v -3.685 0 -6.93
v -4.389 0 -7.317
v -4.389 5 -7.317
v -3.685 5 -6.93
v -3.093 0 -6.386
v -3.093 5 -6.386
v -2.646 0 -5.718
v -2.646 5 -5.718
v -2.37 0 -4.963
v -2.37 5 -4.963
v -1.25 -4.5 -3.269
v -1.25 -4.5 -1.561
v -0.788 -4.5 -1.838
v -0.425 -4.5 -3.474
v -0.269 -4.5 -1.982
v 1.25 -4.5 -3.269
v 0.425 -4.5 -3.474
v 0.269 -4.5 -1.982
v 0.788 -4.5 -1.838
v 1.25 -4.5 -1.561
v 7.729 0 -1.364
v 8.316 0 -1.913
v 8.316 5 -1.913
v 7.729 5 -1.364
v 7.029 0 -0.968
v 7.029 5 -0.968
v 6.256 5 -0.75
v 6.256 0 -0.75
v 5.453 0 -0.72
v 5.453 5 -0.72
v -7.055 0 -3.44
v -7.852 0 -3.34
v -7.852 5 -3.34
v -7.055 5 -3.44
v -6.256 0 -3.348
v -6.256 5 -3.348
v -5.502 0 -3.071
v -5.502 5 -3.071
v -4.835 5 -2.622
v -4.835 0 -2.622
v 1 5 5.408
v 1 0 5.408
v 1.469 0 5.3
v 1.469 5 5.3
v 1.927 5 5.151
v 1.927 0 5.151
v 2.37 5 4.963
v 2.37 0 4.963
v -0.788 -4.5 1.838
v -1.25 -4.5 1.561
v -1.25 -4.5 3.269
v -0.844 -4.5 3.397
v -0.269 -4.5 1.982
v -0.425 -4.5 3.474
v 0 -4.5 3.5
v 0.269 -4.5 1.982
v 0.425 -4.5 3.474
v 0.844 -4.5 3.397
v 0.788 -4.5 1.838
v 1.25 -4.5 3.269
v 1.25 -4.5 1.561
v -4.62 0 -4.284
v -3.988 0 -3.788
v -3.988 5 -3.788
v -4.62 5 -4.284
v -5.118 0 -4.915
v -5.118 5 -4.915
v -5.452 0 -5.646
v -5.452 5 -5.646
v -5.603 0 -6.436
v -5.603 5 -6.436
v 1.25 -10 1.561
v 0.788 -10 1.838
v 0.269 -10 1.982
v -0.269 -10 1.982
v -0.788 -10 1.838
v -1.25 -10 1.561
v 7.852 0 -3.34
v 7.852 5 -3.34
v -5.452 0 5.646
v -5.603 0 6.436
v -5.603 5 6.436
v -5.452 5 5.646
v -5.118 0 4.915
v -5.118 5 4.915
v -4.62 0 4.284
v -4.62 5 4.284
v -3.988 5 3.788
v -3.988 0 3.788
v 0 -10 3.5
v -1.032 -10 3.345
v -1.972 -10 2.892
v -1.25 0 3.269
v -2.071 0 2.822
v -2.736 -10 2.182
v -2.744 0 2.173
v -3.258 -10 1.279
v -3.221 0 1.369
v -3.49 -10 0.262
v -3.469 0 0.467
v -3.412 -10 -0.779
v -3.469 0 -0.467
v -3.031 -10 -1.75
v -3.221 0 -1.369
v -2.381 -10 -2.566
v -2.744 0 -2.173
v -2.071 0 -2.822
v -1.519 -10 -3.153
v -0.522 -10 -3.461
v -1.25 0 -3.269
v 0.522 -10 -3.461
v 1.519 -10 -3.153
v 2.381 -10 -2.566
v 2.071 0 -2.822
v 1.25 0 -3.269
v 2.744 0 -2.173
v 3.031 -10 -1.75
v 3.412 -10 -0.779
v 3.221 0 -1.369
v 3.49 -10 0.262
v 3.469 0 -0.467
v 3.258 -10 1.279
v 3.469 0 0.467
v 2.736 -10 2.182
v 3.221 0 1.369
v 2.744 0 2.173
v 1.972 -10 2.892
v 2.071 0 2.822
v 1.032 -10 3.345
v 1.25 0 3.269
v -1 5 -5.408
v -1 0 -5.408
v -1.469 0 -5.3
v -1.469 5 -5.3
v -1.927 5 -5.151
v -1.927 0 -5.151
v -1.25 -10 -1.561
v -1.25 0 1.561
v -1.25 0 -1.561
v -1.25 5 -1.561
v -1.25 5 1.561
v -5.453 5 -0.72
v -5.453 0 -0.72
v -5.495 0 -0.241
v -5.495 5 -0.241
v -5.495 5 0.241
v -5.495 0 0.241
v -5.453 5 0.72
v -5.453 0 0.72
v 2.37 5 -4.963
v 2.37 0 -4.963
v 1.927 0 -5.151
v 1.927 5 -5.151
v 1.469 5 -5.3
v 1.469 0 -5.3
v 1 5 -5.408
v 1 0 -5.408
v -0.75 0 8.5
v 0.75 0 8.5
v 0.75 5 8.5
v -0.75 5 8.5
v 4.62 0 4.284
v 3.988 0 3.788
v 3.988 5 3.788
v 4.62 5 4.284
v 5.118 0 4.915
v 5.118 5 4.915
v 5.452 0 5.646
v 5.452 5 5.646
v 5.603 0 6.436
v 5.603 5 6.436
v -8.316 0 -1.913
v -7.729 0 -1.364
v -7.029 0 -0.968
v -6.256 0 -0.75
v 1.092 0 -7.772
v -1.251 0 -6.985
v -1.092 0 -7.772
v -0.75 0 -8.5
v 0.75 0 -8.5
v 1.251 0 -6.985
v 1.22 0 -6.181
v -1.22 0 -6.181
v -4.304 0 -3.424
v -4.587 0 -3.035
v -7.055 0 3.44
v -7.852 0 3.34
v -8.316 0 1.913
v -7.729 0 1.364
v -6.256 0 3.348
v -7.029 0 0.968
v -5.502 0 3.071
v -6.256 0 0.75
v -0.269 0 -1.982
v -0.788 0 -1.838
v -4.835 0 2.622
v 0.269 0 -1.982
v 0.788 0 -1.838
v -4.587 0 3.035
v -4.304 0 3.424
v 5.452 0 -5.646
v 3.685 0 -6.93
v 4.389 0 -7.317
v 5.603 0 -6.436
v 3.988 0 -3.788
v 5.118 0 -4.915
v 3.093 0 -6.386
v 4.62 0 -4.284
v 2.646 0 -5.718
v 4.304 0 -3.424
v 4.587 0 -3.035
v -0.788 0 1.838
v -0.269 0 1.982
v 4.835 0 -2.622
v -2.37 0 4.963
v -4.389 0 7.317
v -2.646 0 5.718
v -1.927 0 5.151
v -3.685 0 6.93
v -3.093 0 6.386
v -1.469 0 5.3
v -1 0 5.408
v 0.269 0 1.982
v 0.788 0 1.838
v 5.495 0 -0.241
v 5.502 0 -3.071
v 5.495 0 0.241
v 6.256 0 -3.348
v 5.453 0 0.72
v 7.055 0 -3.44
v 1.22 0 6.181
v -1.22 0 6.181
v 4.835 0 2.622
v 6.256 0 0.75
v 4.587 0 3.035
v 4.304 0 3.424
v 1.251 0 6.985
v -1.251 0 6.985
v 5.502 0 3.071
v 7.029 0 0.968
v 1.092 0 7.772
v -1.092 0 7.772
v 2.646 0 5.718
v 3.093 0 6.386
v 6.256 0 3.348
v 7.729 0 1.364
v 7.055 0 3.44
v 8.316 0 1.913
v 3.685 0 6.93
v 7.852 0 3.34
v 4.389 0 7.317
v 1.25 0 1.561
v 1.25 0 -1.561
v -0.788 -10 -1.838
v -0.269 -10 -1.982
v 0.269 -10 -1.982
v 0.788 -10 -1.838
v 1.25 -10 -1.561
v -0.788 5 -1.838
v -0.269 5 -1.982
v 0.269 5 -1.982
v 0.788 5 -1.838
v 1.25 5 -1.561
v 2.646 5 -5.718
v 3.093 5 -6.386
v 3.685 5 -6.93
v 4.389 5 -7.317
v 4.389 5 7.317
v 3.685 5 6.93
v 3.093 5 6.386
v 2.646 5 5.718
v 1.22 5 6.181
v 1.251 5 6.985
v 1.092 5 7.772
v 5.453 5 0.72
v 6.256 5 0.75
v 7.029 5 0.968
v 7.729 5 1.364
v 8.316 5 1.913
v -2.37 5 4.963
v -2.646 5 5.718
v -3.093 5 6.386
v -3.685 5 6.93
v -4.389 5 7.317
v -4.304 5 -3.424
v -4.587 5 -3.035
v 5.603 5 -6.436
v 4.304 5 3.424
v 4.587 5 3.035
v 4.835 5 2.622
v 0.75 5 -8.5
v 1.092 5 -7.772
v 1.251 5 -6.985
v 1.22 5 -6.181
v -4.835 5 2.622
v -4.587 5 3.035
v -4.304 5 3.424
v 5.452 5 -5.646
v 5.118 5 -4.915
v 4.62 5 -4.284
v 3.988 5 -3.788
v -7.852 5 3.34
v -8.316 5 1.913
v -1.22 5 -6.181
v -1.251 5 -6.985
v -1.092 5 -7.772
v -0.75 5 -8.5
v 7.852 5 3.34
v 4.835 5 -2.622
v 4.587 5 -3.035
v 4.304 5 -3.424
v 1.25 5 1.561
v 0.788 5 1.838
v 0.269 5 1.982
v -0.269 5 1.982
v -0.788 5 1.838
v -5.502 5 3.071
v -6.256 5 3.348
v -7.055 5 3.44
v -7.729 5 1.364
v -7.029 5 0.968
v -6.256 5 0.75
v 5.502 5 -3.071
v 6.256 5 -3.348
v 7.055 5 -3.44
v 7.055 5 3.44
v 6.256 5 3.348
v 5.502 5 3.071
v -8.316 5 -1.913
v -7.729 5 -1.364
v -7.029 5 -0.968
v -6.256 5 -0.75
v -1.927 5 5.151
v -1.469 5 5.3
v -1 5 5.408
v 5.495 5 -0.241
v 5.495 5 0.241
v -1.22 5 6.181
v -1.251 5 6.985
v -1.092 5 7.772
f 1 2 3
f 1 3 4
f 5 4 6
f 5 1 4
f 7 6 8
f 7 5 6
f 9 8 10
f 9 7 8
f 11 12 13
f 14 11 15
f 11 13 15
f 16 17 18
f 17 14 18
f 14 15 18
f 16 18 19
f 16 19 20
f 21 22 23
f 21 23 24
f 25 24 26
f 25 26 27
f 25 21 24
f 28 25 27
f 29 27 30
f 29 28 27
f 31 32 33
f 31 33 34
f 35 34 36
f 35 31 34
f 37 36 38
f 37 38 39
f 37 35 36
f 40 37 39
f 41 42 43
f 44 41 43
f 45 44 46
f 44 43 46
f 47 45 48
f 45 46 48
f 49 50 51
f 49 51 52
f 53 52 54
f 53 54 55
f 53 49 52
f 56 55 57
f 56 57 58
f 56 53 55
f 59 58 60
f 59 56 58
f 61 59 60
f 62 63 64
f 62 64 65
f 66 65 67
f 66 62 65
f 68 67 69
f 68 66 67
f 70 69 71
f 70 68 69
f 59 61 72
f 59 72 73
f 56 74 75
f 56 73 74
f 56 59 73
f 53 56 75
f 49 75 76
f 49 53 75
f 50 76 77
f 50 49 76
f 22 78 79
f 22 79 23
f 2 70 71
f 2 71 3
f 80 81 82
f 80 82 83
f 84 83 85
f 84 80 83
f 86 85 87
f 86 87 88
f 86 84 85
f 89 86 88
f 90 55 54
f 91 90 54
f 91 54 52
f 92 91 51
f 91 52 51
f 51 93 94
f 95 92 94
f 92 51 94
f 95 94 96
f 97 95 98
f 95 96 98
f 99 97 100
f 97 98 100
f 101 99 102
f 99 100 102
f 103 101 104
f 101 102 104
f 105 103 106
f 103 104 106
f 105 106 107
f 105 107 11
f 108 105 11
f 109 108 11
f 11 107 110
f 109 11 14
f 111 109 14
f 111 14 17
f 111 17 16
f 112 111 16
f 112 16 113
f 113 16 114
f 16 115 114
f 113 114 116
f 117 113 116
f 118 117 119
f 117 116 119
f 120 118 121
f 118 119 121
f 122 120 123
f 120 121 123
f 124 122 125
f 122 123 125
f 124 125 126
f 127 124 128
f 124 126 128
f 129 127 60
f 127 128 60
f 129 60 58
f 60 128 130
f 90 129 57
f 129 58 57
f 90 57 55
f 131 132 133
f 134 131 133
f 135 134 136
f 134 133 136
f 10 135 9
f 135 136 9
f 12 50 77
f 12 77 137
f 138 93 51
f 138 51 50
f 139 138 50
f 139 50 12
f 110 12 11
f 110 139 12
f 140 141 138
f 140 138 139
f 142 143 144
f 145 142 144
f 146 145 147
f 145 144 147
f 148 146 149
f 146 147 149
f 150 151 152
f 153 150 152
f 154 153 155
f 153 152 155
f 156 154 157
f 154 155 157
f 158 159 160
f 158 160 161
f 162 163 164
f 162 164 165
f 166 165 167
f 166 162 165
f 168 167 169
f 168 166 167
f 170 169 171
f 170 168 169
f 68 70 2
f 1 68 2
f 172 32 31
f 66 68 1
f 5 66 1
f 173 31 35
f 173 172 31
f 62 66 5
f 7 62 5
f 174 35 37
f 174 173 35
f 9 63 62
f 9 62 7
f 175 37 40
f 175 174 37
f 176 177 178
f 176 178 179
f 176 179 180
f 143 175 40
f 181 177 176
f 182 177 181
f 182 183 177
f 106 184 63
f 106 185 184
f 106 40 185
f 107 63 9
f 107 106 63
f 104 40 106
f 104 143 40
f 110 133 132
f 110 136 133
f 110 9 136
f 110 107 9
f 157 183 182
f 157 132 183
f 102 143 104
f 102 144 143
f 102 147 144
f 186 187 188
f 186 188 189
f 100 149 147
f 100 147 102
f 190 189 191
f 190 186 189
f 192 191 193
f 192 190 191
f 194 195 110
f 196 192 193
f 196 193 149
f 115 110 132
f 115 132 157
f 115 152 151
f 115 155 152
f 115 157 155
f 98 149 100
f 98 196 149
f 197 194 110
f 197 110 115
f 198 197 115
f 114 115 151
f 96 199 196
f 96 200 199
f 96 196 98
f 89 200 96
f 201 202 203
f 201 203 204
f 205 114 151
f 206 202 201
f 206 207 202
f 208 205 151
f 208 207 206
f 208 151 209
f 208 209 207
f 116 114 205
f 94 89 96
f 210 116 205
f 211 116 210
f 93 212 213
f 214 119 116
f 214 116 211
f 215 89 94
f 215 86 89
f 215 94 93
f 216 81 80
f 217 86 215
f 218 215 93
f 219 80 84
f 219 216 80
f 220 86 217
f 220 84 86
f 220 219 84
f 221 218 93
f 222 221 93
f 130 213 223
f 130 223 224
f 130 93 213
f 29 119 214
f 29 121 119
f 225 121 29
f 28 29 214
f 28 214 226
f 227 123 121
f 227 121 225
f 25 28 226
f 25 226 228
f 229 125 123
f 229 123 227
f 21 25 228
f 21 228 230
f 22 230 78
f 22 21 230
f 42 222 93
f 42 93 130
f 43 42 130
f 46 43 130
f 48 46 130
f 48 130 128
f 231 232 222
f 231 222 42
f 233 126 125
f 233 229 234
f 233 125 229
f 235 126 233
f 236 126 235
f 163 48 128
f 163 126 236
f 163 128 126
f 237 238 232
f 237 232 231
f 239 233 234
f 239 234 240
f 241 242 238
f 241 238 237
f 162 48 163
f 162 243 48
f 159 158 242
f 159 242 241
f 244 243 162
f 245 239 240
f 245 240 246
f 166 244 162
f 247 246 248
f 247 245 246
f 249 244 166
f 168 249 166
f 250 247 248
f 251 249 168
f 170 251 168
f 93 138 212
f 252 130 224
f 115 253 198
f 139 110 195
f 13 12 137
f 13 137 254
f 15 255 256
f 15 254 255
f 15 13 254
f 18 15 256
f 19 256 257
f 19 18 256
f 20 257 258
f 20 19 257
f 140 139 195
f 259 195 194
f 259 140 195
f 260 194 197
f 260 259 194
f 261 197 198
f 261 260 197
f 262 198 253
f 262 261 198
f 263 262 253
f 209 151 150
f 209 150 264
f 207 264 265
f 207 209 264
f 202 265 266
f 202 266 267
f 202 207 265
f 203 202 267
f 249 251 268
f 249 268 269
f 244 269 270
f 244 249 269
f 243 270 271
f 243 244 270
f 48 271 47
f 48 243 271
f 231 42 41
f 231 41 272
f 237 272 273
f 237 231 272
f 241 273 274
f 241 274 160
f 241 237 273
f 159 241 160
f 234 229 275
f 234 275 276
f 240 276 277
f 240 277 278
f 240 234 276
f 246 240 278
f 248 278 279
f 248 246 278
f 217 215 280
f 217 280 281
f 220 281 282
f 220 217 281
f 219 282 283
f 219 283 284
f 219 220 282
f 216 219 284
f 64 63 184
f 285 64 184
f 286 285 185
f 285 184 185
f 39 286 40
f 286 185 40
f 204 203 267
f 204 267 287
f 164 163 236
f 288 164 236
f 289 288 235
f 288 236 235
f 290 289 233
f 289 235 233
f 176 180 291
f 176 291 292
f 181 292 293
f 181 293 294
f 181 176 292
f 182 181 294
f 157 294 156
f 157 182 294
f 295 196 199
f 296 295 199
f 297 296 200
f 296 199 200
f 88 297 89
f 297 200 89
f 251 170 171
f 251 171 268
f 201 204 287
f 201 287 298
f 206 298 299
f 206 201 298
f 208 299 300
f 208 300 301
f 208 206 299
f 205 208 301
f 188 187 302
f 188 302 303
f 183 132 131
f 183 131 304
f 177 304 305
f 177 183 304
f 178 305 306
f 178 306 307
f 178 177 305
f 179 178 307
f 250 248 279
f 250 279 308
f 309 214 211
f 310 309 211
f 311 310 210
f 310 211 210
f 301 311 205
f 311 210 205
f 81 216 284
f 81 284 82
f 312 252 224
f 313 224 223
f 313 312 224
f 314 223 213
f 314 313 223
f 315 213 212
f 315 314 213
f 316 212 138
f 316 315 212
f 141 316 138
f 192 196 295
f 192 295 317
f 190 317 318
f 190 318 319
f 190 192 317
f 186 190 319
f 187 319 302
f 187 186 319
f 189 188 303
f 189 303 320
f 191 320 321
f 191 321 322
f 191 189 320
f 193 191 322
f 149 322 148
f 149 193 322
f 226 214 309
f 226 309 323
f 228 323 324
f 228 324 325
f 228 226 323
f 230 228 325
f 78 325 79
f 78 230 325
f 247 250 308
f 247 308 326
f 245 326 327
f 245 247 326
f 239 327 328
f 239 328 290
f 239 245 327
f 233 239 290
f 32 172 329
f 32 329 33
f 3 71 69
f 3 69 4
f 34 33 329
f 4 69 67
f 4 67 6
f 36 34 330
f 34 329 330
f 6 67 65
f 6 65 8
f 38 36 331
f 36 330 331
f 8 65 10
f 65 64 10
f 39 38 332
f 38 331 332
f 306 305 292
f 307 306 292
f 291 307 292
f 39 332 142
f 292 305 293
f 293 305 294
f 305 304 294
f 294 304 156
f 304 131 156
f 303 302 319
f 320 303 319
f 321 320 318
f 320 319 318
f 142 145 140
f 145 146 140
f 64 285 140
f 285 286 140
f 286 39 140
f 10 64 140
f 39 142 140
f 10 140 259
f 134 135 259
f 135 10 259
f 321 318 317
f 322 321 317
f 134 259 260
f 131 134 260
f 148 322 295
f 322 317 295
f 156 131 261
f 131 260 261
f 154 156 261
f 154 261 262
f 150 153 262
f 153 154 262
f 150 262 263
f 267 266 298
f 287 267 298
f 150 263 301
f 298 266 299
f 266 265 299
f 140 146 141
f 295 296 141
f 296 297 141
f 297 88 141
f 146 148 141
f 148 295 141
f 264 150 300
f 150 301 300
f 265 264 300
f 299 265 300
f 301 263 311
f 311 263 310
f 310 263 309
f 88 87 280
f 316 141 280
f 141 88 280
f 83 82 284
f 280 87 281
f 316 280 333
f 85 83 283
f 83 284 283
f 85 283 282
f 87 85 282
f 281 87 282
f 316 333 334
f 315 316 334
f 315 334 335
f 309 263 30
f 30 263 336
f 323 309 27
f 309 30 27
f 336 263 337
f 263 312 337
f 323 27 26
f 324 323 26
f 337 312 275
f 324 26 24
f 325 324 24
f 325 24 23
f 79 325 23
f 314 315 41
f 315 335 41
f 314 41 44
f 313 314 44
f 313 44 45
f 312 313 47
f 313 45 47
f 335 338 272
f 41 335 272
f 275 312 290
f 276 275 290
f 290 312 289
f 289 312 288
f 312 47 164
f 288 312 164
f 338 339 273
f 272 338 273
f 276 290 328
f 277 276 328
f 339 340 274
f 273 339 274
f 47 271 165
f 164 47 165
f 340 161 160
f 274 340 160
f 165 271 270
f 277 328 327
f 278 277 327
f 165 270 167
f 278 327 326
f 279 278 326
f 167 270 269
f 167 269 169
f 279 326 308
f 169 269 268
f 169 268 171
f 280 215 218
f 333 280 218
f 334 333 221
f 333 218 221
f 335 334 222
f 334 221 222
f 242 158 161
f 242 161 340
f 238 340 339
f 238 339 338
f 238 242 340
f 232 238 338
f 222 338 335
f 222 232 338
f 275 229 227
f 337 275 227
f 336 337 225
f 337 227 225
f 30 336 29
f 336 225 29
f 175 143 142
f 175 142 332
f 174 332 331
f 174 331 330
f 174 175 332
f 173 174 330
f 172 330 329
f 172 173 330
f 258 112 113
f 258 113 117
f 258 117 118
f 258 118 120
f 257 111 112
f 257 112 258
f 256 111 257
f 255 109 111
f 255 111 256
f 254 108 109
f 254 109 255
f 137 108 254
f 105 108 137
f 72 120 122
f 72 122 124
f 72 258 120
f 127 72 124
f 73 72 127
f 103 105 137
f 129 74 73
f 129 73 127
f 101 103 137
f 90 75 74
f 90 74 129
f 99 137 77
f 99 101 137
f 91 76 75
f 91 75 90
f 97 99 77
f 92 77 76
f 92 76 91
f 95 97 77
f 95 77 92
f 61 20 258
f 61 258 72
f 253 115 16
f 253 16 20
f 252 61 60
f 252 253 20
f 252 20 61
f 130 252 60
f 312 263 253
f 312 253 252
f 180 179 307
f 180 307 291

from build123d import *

# Parameters (mm, degrees)
SKETCH_1_R                      = 5.5
EXTRUDE_1_DEPTH                 = 5
EXTRUDE_START                   = -5
EXTRUDE_2_DEPTH                 = 5
SKETCH_3_R                      = 3.5
EXTRUDE_3_DEPTH                 = 10
CUT_EXTRUDE_1_DEPTH             = 20.141619155
CUT_EXTRUDE_2_REACH             = 17.537
SKETCH_5_W                      = 2.5
SKETCH_5_H                      = 4.5
CUT_EXTRUDE_2_DIRECTION_2_REACH = 17.537


with BuildPart() as part:
    # 草图1 → 凸台-拉伸1 (new body)
    with BuildSketch(Plane(origin=(0, 0, 0), x_dir=(1, 0, 0), z_dir=(0, 1, 0))):
        with Locations(Location((0, 0, 0), (0, 0, 270))):
            Circle(SKETCH_1_R)
    extrude(amount=EXTRUDE_1_DEPTH)

    # 草图2 → 凸台-拉伸2 (add)
    with BuildSketch(Plane(origin=(0, 5, 0), x_dir=(-1, 0, 0), z_dir=(0, 1, 0)).offset(EXTRUDE_START)):
        with BuildLine():
            Line((-4.389411899, -7.317483391), (-5.60293739, -6.435805513))
            ThreePointArc((-5.60293739, -6.435805513), (-5.11774735, -4.915167527), (-3.987951794, -3.787643132))
            ThreePointArc((-3.987951794, -3.787643132), (-3.232818888, -4.449593469), (-2.369917805, -4.963213636))
            ThreePointArc((-2.369917805, -4.963213636), (-3.093131201, -6.386137262), (-4.389411899, -7.317483391))
        make_face()
        with BuildLine():
            Line((-7.852217643, -3.339936839), (-8.315743134, -1.913352065))
            ThreePointArc((-8.315743134, -1.913352065), (-7.029407564, -0.968317642), (-5.452641547, -0.720208411))
            ThreePointArc((-5.452641547, -0.720208411), (-5.23081084, -1.699593469), (-4.834607559, -2.622321444))
            ThreePointArc((-4.834607559, -2.622321444), (-6.256073009, -3.34839667), (-7.852217643, -3.339936839))
        make_face()
        with BuildLine():
            Line((-8.315743134, 1.913352065), (-7.852217643, 3.339936839))
            ThreePointArc((-7.852217643, 3.339936839), (-6.256073009, 3.34839667), (-4.834607559, 2.622321444))
            ThreePointArc((-4.834607559, 2.622321444), (-5.23081084, 1.699593469), (-5.452641547, 0.720208411))
            ThreePointArc((-5.452641547, 0.720208411), (-7.029407564, 0.968317642), (-8.315743134, 1.913352065))
        make_face()
        with BuildLine():
            Line((-5.60293739, 6.435805513), (-4.389411899, 7.317483391))
            ThreePointArc((-4.389411899, 7.317483391), (-3.093131201, 6.386137262), (-2.369917805, 4.963213636))
            ThreePointArc((-2.369917805, 4.963213636), (-3.232818888, 4.449593469), (-3.987951794, 3.787643132))
            ThreePointArc((-3.987951794, 3.787643132), (-5.11774735, 4.915167527), (-5.60293739, 6.435805513))
        make_face()
        with BuildLine():
            Line((-0.75, 8.5), (0.75, 8.5))
            ThreePointArc((0.75, 8.5), (1.251281594, 6.984590476), (1, 5.408326913))
            ThreePointArc((1, 5.408326913), (0, 5.5), (-1, 5.408326913))
            ThreePointArc((-1, 5.408326913), (-1.251281594, 6.984590476), (-0.75, 8.5))
        make_face()
        with BuildLine():
            Line((4.389411899, 7.317483391), (5.60293739, 6.435805513))
            ThreePointArc((5.60293739, 6.435805513), (5.11774735, 4.915167527), (3.987951794, 3.787643132))
            ThreePointArc((3.987951794, 3.787643132), (3.232818888, 4.449593469), (2.369917805, 4.963213636))
            ThreePointArc((2.369917805, 4.963213636), (3.093131201, 6.386137262), (4.389411899, 7.317483391))
        make_face()
        with BuildLine():
            Line((0.75, -8.5), (-0.75, -8.5))
            ThreePointArc((-0.75, -8.5), (-1.251281594, -6.984590476), (-1, -5.408326913))
            ThreePointArc((-1, -5.408326913), (0, -5.5), (1, -5.408326913))
            ThreePointArc((1, -5.408326913), (1.251281594, -6.984590476), (0.75, -8.5))
        make_face()
        with BuildLine():
            Line((7.852217643, 3.339936839), (8.315743134, 1.913352065))
            ThreePointArc((8.315743134, 1.913352065), (7.029407564, 0.968317642), (5.452641547, 0.720208411))
            ThreePointArc((5.452641547, 0.720208411), (5.23081084, 1.699593469), (4.834607559, 2.622321444))
            ThreePointArc((4.834607559, 2.622321444), (6.256073009, 3.34839667), (7.852217643, 3.339936839))
        make_face()
        with BuildLine():
            Line((8.315743134, -1.913352065), (7.852217643, -3.339936839))
            ThreePointArc((7.852217643, -3.339936839), (6.256073009, -3.34839667), (4.834607559, -2.622321444))
            ThreePointArc((4.834607559, -2.622321444), (5.23081084, -1.699593469), (5.452641547, -0.720208411))
            ThreePointArc((5.452641547, -0.720208411), (7.029407564, -0.968317642), (8.315743134, -1.913352065))
        make_face()
        with BuildLine():
            Line((5.60293739, -6.435805513), (4.389411899, -7.317483391))
            ThreePointArc((4.389411899, -7.317483391), (3.093131201, -6.386137262), (2.369917805, -4.963213636))
            ThreePointArc((2.369917805, -4.963213636), (3.232818888, -4.449593469), (3.987951794, -3.787643132))
            ThreePointArc((3.987951794, -3.787643132), (5.11774735, -4.915167527), (5.60293739, -6.435805513))
        make_face()
    extrude(amount=EXTRUDE_2_DEPTH)

    # 草图3 → 凸台-拉伸3 (add)
    with BuildSketch(Plane.XZ):
        with Locations(Location((0, 0, 0), (0, 0, 90))):
            Circle(SKETCH_3_R)
    extrude(amount=EXTRUDE_3_DEPTH)

    # 草图4 → 切除-拉伸1 (cut, through all)
    with BuildSketch(Plane(origin=(0, 5, 0), x_dir=(-1, 0, 0), z_dir=(0, 1, 0))):
        with BuildLine():
            Line((1.25, 1.5612495), (1.25, -1.5612495))
            ThreePointArc((1.25, -1.5612495), (0, -2), (-1.25, -1.5612495))
            Line((-1.25, -1.5612495), (-1.25, 1.5612495))
            ThreePointArc((-1.25, 1.5612495), (0, 2), (1.25, 1.5612495))
        make_face()
    extrude(amount=-CUT_EXTRUDE_1_DEPTH, mode=Mode.SUBTRACT)

    # 草图5 → 切除-拉伸2 (cut, up to next)
    with BuildSketch(Plane.XY, mode=Mode.PRIVATE) as cut_extrude_2_sk1:
        with Locations((0, -2.25)):
            Rectangle(SKETCH_5_W, SKETCH_5_H)
    cut_extrude_2_tool1 = extrude(cut_extrude_2_sk1.sketch, amount=-CUT_EXTRUDE_2_REACH, mode=Mode.PRIVATE) & part.part
    add(cut_extrude_2_tool1.solids().sort_by_distance((0, -2.25, 0))[0], mode=Mode.SUBTRACT)

    # 草图5 → 切除-拉伸2 direction 2 (cut, up to next)
    with BuildSketch(Plane.XY, mode=Mode.PRIVATE) as cut_extrude_2_direction_2_sk1:
        with Locations((0, -2.25)):
            Rectangle(SKETCH_5_W, SKETCH_5_H)
    cut_extrude_2_direction_2_tool1 = extrude(cut_extrude_2_direction_2_sk1.sketch, amount=CUT_EXTRUDE_2_DIRECTION_2_REACH, mode=Mode.PRIVATE) & part.part
    add(cut_extrude_2_direction_2_tool1.solids().sort_by_distance((0, -2.25, 0))[0], mode=Mode.SUBTRACT)


solid = part.part
